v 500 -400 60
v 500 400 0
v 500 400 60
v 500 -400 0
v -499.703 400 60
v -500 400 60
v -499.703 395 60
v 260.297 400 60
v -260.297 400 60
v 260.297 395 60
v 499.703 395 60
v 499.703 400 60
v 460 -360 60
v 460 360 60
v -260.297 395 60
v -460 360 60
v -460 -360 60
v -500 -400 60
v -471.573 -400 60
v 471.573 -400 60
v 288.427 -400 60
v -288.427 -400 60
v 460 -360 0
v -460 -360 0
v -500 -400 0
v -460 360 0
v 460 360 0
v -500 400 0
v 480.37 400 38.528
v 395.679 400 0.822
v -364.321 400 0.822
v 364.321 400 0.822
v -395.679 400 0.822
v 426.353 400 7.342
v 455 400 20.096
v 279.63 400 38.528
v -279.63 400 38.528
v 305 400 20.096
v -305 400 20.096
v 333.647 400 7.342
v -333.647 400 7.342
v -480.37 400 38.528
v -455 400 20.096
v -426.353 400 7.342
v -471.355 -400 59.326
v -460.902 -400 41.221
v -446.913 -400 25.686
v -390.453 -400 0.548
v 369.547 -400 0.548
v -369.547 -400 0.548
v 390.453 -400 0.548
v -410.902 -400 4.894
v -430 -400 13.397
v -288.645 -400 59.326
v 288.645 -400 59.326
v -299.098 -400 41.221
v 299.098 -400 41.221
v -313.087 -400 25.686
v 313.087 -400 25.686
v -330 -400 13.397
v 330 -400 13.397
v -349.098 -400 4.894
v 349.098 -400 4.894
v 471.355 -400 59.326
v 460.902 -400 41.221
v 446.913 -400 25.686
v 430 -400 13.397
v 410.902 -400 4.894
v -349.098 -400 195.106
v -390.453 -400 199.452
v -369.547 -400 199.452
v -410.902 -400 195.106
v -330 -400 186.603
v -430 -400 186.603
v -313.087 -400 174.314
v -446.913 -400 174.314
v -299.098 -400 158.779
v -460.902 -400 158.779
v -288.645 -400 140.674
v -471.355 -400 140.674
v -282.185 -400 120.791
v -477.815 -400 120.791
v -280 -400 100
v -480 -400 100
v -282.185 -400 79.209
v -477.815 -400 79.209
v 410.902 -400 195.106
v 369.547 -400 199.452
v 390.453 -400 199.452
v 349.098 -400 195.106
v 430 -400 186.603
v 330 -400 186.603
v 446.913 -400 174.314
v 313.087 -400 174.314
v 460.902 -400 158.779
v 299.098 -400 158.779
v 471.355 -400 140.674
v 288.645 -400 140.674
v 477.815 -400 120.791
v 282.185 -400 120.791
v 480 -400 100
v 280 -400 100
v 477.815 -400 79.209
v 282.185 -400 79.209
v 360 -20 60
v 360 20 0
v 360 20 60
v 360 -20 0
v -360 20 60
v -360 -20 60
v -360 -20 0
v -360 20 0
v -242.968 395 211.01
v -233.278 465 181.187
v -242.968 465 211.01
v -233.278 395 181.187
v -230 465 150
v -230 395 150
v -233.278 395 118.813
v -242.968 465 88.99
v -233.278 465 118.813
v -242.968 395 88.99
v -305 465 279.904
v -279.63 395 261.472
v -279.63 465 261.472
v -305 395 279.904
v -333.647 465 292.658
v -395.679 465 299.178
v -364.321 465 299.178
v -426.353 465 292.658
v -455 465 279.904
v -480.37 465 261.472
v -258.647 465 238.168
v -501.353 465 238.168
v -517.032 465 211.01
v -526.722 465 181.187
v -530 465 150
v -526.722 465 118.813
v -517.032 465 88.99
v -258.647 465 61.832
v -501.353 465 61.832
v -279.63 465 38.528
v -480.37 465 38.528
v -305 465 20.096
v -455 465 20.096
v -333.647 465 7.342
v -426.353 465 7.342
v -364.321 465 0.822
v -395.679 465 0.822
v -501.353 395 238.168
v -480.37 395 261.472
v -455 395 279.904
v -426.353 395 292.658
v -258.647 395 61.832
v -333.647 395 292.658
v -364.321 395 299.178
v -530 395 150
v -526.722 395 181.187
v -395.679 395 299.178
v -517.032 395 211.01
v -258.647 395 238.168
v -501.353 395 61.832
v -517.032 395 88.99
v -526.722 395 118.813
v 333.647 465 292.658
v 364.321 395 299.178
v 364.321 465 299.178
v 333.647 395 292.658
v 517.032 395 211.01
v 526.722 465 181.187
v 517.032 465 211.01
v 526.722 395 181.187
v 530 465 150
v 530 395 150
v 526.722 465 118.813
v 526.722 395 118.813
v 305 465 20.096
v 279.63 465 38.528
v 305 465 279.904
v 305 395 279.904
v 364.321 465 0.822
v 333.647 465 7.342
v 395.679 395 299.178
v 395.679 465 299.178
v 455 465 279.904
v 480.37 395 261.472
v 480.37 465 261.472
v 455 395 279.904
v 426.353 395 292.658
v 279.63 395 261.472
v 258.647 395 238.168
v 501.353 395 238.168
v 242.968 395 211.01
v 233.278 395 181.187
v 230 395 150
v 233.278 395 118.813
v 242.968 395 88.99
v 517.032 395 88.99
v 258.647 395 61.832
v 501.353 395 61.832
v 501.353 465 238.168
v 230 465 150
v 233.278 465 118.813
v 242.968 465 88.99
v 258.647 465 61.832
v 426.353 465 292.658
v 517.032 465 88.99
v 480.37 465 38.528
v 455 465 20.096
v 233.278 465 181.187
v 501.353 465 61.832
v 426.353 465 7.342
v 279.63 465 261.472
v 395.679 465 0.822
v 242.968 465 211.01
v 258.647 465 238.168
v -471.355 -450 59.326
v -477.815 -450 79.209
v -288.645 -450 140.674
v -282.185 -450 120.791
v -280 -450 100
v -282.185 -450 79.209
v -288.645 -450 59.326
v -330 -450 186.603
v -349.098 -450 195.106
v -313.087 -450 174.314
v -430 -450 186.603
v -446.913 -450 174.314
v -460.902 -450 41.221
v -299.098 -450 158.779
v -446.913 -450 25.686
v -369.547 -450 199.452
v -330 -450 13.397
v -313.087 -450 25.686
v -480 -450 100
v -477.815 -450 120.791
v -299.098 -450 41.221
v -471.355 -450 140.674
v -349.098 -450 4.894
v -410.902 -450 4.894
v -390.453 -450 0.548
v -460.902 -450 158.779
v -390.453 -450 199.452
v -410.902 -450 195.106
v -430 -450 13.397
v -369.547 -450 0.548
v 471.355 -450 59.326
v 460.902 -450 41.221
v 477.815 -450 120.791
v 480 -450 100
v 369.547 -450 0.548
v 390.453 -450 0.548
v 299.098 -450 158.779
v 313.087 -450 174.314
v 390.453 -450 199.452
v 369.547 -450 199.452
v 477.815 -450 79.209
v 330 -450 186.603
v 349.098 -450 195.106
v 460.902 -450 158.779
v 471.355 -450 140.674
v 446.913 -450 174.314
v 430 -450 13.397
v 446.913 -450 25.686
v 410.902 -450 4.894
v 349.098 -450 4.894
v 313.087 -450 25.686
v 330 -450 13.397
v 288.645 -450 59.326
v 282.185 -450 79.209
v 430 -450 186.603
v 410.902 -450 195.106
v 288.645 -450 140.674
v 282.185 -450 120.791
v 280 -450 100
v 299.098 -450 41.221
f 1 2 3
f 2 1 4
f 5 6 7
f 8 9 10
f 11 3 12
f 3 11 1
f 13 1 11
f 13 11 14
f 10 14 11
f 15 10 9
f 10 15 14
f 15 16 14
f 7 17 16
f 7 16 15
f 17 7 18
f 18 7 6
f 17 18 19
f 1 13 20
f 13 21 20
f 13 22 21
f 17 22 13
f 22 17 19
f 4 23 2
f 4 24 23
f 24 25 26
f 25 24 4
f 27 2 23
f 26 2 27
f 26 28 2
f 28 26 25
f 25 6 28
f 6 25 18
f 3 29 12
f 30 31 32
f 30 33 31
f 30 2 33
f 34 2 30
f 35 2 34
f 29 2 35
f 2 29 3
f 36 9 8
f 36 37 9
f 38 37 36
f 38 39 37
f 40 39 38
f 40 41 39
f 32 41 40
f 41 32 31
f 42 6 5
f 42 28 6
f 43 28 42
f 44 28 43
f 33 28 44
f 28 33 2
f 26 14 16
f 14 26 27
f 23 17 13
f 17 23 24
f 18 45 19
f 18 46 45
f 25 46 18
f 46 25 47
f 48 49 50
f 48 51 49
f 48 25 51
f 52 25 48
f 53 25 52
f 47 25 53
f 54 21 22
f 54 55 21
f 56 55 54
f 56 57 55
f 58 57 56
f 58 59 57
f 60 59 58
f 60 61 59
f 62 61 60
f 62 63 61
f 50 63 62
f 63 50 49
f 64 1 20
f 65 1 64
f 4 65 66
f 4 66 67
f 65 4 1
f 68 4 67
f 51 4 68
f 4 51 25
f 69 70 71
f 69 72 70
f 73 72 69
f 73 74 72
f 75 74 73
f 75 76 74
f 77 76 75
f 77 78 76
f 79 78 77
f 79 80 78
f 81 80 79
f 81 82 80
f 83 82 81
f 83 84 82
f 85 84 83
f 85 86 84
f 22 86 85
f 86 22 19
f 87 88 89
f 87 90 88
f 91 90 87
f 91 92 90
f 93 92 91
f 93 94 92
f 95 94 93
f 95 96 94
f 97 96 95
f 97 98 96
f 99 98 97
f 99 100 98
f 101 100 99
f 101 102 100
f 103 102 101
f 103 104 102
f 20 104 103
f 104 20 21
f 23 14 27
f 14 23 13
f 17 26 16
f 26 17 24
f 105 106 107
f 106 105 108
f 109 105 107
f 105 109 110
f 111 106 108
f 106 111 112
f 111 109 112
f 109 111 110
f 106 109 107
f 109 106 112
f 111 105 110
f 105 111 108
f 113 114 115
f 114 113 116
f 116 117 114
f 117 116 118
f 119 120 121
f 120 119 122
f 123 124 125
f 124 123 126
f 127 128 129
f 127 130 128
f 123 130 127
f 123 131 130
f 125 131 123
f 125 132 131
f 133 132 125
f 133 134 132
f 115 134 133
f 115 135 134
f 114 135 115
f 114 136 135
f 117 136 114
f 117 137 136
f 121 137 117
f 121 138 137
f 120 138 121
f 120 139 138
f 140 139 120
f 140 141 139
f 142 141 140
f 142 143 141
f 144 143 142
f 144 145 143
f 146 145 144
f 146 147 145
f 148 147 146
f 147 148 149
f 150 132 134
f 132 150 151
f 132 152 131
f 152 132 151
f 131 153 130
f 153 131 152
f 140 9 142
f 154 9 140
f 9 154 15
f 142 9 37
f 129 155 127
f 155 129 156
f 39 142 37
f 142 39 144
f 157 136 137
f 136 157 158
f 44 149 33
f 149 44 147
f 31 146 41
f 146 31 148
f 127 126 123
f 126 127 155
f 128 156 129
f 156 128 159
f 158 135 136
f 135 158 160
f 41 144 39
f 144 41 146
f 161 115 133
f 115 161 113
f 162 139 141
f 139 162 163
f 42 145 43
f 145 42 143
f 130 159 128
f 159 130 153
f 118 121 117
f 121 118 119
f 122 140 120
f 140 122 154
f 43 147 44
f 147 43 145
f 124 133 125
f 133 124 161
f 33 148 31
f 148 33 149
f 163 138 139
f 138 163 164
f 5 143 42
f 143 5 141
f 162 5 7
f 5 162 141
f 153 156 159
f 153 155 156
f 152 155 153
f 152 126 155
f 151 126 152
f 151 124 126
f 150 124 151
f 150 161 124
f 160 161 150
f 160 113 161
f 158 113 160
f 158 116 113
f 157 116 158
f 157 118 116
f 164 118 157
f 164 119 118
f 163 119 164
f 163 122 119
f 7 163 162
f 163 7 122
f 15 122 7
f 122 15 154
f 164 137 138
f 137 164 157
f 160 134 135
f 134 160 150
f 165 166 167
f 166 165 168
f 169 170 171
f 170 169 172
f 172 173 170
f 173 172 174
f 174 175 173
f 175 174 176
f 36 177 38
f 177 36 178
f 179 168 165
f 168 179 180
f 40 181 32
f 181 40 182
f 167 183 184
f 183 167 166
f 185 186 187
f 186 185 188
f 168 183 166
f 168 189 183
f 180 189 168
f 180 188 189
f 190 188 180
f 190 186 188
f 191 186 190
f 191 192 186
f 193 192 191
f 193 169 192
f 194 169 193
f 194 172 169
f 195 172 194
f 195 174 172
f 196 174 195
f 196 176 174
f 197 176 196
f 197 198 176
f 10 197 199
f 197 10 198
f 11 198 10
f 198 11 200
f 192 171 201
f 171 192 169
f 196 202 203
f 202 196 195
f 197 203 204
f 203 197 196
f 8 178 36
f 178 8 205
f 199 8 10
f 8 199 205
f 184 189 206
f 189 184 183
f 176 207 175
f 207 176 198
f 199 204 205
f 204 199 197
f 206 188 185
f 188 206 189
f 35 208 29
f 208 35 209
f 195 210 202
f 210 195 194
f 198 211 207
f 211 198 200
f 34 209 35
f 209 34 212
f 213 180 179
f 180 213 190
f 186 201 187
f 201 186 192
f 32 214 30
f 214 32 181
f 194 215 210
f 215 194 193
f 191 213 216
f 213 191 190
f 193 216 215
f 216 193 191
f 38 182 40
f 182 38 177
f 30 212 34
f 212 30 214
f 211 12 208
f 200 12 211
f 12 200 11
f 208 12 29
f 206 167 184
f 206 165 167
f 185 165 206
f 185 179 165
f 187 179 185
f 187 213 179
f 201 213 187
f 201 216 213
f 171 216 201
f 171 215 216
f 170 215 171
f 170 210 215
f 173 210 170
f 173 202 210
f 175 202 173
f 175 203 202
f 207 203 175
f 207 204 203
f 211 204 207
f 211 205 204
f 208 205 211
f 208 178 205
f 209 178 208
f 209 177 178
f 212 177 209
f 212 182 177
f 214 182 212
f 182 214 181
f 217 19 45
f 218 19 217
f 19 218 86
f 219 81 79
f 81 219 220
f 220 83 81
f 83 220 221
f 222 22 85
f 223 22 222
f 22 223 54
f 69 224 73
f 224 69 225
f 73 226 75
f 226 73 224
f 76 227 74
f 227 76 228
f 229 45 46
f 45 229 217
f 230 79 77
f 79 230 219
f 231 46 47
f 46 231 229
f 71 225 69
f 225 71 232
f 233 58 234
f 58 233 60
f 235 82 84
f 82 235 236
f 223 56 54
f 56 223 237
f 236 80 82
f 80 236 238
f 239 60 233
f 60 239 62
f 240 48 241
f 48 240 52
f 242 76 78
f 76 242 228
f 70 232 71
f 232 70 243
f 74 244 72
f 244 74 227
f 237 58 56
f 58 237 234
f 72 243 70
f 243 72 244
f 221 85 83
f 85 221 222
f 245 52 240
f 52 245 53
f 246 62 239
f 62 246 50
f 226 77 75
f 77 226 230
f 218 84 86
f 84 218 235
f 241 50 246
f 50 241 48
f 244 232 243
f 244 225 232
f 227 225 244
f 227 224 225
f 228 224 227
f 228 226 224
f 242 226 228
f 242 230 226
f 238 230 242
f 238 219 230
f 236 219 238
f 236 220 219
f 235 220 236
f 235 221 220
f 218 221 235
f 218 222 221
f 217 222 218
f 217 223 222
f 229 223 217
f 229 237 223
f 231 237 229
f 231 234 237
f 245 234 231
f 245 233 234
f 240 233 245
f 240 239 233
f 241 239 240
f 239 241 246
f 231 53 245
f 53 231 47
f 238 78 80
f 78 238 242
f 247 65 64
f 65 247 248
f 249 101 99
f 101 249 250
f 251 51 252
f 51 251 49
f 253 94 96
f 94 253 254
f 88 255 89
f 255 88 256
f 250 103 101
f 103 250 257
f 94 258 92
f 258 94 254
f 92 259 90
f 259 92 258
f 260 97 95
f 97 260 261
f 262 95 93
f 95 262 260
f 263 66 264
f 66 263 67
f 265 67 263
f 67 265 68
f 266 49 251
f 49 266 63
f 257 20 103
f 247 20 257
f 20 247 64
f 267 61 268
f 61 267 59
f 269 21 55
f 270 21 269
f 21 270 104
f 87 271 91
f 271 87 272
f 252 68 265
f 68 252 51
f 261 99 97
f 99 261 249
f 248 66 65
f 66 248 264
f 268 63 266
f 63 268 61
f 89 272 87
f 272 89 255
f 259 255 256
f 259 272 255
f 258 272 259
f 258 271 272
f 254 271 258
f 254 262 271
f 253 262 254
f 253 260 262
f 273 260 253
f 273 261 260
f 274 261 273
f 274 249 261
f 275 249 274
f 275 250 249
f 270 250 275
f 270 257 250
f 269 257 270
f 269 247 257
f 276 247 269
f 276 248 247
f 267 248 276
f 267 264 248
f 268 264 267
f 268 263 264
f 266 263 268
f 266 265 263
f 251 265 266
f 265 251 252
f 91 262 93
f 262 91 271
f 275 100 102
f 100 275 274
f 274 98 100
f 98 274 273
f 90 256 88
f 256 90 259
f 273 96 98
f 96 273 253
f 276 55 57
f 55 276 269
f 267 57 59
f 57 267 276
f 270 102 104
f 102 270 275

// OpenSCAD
// Mobile base frame v1 placeholder
// Units: mm
// Football-field movable chassis envelope.

base_l = 1000;
base_w = 800;
rail = 40;
height = 60;
rear_wheel_d = 300;  // 10~12 inch pneumatic wheel placeholder
front_wheel_d = 200; // 8 inch caster placeholder

module rail_box(x,y,z){ cube([x,y,z], center=true); }

module mobile_base_frame(){
  color("#334155") union(){
    translate([0, base_w/2-rail/2, height/2]) rail_box(base_l, rail, height);
    translate([0,-base_w/2+rail/2, height/2]) rail_box(base_l, rail, height);
    translate([ base_l/2-rail/2,0,height/2]) rail_box(rail, base_w, height);
    translate([-base_l/2+rail/2,0,height/2]) rail_box(rail, base_w, height);
    translate([0,0,height/2]) rail_box(base_l*0.72, rail, height);
  }
  // wheels visual
  color("#111827") {
    translate([-base_l/2+120, base_w/2+30, rear_wheel_d/2]) rotate([90,0,0]) cylinder(h=70,d=rear_wheel_d,center=true);
    translate([ base_l/2-120, base_w/2+30, rear_wheel_d/2]) rotate([90,0,0]) cylinder(h=70,d=rear_wheel_d,center=true);
    translate([-base_l/2+120,-base_w/2-25, front_wheel_d/2]) rotate([90,0,0]) cylinder(h=50,d=front_wheel_d,center=true);
    translate([ base_l/2-120,-base_w/2-25, front_wheel_d/2]) rotate([90,0,0]) cylinder(h=50,d=front_wheel_d,center=true);
  }
}

mobile_base_frame();
